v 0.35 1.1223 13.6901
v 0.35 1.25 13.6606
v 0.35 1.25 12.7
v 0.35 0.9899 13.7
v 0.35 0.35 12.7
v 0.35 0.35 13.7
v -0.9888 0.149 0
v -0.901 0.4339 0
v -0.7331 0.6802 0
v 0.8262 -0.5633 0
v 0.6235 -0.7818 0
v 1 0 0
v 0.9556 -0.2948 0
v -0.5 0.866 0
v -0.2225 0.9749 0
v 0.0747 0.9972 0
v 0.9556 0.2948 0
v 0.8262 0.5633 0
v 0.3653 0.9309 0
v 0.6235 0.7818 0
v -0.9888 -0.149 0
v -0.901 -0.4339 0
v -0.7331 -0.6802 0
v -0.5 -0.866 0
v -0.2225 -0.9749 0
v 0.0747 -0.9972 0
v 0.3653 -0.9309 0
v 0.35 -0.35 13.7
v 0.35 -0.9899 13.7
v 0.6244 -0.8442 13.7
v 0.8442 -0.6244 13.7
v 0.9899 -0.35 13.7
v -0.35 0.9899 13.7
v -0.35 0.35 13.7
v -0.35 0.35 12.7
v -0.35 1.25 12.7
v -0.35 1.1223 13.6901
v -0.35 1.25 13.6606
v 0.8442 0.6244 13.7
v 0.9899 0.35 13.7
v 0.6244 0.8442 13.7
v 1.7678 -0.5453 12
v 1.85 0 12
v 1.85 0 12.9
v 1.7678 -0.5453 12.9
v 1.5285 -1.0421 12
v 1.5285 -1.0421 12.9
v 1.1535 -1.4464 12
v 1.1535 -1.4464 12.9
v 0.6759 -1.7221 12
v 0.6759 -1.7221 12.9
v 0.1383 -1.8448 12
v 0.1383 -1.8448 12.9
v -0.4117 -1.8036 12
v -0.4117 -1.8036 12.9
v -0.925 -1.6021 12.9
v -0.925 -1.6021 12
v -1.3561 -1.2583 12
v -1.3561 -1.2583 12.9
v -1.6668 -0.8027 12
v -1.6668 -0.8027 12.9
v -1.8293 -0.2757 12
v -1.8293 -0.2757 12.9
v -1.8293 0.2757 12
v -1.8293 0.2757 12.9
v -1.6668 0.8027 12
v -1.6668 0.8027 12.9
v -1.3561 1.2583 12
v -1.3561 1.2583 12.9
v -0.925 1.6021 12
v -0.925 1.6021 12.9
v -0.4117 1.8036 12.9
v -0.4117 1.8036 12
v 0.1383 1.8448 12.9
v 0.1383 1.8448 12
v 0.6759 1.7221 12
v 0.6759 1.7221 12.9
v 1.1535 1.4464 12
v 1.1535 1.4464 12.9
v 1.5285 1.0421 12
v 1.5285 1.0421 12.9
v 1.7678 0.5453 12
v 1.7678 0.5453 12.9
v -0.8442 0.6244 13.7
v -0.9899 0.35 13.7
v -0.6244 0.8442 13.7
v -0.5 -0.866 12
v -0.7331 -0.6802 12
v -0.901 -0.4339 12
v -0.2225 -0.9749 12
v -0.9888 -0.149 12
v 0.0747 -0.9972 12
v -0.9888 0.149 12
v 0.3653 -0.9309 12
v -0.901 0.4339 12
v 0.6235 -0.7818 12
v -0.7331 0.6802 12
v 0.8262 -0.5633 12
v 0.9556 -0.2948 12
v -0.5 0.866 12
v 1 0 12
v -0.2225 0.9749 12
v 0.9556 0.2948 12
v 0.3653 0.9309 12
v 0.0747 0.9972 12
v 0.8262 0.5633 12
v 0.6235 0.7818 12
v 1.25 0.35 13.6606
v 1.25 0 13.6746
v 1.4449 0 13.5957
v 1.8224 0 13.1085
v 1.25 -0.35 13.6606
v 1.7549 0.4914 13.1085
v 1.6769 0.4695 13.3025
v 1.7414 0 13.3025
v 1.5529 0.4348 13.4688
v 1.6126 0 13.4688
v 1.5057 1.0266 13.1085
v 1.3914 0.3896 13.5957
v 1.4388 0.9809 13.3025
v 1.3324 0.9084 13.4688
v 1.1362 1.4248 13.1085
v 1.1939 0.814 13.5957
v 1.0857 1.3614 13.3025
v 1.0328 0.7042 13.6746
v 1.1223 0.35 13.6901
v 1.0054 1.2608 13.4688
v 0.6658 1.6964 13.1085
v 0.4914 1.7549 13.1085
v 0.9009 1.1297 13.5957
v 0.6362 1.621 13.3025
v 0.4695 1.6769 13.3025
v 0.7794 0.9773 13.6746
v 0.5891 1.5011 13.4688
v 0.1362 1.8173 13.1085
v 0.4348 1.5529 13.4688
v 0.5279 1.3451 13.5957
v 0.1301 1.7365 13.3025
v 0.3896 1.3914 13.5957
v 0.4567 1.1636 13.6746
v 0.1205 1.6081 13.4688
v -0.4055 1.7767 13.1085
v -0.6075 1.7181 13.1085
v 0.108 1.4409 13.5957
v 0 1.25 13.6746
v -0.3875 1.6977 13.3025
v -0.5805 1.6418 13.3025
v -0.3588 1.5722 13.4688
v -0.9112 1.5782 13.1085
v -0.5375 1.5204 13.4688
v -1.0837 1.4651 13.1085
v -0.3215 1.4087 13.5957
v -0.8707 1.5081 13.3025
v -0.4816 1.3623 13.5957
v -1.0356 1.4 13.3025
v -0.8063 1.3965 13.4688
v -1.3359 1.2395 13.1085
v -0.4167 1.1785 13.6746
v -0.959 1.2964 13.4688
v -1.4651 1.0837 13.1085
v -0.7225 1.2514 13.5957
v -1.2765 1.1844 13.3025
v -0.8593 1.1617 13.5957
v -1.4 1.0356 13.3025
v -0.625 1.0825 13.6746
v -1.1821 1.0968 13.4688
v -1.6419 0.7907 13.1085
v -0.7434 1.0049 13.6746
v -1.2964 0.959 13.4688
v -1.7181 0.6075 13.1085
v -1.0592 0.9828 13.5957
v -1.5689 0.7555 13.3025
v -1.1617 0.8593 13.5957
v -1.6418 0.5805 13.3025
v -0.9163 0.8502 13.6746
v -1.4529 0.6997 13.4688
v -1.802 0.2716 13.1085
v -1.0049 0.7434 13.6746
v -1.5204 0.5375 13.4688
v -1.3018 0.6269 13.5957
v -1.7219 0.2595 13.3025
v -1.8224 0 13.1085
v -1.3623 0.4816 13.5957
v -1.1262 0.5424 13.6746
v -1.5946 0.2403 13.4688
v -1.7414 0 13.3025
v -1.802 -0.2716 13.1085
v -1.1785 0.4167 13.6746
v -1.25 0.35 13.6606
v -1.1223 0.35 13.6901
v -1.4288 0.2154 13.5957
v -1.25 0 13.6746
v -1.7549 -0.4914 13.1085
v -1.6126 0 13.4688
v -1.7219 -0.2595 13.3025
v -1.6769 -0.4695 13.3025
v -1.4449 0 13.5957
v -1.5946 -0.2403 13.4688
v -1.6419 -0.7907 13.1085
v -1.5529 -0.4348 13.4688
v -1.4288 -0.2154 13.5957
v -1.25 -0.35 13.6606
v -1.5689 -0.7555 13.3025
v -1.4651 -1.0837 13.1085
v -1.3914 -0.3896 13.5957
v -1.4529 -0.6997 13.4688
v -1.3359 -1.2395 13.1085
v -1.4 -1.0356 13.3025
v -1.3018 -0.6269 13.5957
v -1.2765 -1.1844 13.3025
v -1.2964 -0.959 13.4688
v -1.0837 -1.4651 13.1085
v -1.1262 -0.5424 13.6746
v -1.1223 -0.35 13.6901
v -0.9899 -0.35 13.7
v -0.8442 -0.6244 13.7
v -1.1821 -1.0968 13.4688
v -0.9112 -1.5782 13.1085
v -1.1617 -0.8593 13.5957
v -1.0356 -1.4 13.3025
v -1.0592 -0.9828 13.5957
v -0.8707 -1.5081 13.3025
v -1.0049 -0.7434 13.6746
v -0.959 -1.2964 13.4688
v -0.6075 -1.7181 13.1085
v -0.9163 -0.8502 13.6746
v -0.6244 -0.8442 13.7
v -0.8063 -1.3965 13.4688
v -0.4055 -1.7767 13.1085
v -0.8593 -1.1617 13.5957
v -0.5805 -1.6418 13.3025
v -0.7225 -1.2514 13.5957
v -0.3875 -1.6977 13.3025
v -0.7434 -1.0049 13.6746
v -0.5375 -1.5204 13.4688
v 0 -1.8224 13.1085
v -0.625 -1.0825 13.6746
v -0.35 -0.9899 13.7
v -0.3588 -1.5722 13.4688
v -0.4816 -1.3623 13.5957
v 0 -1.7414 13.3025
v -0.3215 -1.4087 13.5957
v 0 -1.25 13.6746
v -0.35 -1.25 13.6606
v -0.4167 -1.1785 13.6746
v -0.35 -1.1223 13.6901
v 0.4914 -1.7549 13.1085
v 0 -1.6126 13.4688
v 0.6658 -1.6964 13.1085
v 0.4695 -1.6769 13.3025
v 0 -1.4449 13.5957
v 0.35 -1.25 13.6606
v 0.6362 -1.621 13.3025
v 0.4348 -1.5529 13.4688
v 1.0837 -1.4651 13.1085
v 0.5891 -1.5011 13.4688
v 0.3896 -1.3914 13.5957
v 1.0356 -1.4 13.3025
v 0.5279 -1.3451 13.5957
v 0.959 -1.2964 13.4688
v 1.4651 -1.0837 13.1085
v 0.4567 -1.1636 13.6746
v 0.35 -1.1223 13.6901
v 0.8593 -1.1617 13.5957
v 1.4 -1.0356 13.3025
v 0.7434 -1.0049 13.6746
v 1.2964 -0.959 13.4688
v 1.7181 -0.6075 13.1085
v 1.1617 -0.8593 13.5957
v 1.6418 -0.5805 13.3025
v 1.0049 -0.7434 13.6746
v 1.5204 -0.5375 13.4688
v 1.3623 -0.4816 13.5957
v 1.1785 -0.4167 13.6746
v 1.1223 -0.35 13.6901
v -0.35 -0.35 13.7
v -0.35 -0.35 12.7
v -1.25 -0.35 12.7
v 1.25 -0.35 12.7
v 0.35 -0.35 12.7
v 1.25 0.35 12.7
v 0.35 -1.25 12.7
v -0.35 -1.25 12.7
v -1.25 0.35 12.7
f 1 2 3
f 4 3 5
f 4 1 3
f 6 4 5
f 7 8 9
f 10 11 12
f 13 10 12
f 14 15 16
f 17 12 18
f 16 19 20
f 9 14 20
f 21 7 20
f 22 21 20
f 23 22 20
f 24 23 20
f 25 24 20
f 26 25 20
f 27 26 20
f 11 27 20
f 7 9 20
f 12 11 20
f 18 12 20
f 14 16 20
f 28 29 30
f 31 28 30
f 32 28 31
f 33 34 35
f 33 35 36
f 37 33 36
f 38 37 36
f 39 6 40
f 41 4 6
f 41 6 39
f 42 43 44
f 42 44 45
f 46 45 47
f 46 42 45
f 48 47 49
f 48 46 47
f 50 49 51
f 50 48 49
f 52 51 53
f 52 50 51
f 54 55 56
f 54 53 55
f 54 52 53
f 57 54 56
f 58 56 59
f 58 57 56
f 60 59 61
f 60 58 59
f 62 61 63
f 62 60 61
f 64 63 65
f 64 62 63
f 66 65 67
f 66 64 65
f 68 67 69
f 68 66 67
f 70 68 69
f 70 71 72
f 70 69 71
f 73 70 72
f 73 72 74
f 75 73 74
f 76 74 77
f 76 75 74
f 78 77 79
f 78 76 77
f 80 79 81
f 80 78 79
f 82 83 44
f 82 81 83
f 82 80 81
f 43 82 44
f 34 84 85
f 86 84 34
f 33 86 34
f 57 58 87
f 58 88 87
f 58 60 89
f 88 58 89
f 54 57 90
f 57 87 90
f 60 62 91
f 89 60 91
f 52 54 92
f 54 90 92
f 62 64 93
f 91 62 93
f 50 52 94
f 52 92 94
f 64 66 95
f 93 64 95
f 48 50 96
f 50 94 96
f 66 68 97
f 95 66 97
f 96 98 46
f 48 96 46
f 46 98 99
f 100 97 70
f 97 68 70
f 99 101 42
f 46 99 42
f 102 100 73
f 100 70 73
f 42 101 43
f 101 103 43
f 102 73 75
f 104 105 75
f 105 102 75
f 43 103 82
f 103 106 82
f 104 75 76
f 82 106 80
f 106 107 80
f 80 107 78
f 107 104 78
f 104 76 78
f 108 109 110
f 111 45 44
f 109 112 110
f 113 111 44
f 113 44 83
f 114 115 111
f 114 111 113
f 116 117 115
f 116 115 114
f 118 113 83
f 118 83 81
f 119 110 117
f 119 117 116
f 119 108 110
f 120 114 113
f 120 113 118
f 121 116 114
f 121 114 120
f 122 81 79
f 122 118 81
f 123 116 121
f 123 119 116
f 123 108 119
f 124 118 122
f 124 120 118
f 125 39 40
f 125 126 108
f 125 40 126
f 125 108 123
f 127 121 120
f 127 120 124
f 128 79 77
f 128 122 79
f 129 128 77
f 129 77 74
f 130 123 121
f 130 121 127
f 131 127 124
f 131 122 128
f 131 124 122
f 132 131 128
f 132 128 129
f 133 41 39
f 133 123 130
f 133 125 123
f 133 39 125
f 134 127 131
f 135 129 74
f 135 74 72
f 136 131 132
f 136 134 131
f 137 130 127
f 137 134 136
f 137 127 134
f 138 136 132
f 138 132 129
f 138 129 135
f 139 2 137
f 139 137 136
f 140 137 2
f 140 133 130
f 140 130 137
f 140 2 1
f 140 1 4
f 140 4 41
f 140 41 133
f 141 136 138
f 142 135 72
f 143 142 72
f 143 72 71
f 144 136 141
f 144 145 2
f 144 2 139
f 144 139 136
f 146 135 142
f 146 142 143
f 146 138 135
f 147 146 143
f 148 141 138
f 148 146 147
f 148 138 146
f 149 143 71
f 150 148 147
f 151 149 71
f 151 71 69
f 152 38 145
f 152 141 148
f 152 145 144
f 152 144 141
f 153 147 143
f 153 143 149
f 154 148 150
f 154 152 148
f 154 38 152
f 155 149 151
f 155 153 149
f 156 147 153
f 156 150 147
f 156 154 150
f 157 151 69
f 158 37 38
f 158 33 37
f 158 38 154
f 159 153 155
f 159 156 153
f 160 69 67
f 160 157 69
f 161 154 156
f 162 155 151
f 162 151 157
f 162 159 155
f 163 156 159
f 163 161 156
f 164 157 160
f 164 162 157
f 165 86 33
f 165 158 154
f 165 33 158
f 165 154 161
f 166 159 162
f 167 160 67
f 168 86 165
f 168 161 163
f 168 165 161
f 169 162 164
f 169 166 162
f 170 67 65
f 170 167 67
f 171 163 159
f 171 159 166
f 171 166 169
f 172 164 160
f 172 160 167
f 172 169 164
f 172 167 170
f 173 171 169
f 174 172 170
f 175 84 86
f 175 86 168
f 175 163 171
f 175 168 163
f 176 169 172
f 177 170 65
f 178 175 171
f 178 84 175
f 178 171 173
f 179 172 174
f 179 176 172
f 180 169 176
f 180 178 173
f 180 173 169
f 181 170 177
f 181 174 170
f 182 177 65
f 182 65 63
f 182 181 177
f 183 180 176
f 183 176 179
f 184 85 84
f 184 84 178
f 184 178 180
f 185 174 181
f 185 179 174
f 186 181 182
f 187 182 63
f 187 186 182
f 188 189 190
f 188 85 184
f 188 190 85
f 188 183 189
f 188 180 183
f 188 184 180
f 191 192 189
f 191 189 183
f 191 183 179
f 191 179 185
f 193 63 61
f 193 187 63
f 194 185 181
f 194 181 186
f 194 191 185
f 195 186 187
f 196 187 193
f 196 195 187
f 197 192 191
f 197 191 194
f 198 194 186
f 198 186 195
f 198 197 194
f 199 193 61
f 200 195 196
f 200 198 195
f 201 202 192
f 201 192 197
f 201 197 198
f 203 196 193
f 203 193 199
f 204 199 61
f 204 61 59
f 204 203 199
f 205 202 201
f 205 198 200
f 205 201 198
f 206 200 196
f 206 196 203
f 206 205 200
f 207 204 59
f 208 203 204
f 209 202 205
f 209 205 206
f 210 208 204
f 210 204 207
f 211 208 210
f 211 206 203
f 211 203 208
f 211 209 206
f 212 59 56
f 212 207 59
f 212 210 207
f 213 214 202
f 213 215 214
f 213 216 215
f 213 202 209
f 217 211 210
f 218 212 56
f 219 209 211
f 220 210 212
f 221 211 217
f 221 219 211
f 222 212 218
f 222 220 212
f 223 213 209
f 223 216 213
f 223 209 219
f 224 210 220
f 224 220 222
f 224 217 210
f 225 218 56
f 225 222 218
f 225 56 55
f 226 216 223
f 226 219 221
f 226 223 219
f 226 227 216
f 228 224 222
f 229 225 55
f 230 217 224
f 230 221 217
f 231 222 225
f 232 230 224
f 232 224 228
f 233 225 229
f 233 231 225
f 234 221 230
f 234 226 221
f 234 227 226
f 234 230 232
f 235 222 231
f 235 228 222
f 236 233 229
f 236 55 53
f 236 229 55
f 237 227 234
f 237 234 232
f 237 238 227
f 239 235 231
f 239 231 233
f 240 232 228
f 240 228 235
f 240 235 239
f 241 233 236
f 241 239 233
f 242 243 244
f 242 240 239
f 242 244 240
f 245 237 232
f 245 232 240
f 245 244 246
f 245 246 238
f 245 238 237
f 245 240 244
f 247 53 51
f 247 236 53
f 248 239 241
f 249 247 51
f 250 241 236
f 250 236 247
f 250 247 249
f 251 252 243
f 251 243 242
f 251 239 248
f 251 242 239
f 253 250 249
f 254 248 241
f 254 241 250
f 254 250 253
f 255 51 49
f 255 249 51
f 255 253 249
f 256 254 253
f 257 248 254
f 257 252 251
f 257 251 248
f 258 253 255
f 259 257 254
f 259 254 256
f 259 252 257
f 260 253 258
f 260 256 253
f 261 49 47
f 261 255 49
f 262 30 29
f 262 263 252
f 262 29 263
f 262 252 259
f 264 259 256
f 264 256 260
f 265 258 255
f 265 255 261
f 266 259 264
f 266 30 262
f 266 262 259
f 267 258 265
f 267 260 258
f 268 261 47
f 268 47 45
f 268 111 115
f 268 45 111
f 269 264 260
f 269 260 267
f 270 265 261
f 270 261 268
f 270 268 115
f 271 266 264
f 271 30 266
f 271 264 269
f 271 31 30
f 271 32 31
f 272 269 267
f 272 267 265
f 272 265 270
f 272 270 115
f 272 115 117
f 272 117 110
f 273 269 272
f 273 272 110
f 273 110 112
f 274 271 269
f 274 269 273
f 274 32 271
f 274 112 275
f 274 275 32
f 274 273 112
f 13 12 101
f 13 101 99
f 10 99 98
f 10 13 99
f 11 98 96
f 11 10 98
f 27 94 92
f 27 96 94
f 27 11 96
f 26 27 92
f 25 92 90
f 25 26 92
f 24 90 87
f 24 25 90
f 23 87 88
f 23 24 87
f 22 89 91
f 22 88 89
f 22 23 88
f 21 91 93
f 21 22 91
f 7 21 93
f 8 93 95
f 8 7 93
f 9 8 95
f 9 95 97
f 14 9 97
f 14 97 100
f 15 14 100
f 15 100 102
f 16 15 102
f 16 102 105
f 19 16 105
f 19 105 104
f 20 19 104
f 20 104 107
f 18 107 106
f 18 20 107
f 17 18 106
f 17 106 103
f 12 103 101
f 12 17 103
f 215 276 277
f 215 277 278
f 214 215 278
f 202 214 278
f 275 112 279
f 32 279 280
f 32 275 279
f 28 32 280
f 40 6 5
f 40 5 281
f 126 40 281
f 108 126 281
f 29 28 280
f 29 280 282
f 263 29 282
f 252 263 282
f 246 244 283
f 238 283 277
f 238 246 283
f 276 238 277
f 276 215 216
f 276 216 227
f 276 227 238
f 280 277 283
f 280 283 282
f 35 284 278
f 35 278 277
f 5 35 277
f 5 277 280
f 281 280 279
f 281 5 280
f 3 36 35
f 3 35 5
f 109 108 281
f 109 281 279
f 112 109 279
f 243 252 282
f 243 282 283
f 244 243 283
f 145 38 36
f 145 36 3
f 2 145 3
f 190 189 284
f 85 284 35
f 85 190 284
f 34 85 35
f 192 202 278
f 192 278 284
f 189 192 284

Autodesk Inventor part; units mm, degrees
ref_plane "YZ Plane" through (0, 0, 0) normal (1, 0, 0) x (0, 1, 0)
ref_plane "XZ Plane" through (0, 0, 0) normal (0, 1, 0) x (-1, 0, 0)
ref_plane "XY Plane" through (0, 0, 0) normal (0, 0, 1) x (1, 0, 0)
sketch "Sketch1" plane through (0, 0, 0) normal (0, 0, 1) x (1, 0, 0)
  circle A0 centre (0, 0) radius 1
  dimension "d0" = 2
extrude "Extrusion1" add sketch "Sketch1" along normal blind 12
thread "Thread1" size "M2x0.4" class "6g" standard "ANSI Metric M Profile" full length
sketch "Sketch2" plane through (0, 0, 12) normal (0, 0, 1) x (1, 0, 0)
  circle A0 centre (0, 0) radius 1 projected
  circle A1 centre (0, 0) radius 1.85
  dimension "d6" = 3.7
extrude "Extrusion2" add sketch "Sketch2" along normal blind 1.7 contours A0 | A1
fillet "Fillet1" radius 0.8 1 edges at (-1.85, 0, 13.7)
sketch "Sketch3" plane through (0, 0, 13.7) normal (0, 0, 1) x (1, 0, 0)
  circle A0 centre (0, 0) radius 1.05 projected
  line L0 (-0.35, 1.25) -> (0.35, 1.25)
  line L1 (0.35, 1.25) -> (0.35, -1.25)
  line L2 (0.35, -1.25) -> (-0.35, -1.25)
  line L3 (-0.35, -1.25) -> (-0.35, 1.25)
  line L4 (-1.25, 0.35) -> (1.25, 0.35)
  line L5 (1.25, 0.35) -> (1.25, -0.35)
  line L6 (1.25, -0.35) -> (-1.25, -0.35)
  line L7 (-1.25, -0.35) -> (-1.25, 0.35)
  point P0 (0, 1.25)
  point P1 (0.35, 0)
  point P2 (-1.25, 0)
  point P3 (0, 0.35)
  dimension "d11" = 0.7
  dimension "d15" = 2.5
  dimension "d16" = 0.7
  dimension "d17" = 2.5
extrude "Extrusion3" cut sketch "Sketch3" against normal blind 1 contours A0 L6 L1 L4 | A0 L4 L5 L6 | L1 L4 L3 A0 | A0 L3 L0 L1 | L1 L6 L3 L4 | L1 L2 L3 A0 | A0 L3 L6 L1 | L3 L6 A0 L4 | A0 L6 L7 L4
equation "\"d16\" = d11"
equation "\"d17\" = d15"
properties part number "M2 Screw"
